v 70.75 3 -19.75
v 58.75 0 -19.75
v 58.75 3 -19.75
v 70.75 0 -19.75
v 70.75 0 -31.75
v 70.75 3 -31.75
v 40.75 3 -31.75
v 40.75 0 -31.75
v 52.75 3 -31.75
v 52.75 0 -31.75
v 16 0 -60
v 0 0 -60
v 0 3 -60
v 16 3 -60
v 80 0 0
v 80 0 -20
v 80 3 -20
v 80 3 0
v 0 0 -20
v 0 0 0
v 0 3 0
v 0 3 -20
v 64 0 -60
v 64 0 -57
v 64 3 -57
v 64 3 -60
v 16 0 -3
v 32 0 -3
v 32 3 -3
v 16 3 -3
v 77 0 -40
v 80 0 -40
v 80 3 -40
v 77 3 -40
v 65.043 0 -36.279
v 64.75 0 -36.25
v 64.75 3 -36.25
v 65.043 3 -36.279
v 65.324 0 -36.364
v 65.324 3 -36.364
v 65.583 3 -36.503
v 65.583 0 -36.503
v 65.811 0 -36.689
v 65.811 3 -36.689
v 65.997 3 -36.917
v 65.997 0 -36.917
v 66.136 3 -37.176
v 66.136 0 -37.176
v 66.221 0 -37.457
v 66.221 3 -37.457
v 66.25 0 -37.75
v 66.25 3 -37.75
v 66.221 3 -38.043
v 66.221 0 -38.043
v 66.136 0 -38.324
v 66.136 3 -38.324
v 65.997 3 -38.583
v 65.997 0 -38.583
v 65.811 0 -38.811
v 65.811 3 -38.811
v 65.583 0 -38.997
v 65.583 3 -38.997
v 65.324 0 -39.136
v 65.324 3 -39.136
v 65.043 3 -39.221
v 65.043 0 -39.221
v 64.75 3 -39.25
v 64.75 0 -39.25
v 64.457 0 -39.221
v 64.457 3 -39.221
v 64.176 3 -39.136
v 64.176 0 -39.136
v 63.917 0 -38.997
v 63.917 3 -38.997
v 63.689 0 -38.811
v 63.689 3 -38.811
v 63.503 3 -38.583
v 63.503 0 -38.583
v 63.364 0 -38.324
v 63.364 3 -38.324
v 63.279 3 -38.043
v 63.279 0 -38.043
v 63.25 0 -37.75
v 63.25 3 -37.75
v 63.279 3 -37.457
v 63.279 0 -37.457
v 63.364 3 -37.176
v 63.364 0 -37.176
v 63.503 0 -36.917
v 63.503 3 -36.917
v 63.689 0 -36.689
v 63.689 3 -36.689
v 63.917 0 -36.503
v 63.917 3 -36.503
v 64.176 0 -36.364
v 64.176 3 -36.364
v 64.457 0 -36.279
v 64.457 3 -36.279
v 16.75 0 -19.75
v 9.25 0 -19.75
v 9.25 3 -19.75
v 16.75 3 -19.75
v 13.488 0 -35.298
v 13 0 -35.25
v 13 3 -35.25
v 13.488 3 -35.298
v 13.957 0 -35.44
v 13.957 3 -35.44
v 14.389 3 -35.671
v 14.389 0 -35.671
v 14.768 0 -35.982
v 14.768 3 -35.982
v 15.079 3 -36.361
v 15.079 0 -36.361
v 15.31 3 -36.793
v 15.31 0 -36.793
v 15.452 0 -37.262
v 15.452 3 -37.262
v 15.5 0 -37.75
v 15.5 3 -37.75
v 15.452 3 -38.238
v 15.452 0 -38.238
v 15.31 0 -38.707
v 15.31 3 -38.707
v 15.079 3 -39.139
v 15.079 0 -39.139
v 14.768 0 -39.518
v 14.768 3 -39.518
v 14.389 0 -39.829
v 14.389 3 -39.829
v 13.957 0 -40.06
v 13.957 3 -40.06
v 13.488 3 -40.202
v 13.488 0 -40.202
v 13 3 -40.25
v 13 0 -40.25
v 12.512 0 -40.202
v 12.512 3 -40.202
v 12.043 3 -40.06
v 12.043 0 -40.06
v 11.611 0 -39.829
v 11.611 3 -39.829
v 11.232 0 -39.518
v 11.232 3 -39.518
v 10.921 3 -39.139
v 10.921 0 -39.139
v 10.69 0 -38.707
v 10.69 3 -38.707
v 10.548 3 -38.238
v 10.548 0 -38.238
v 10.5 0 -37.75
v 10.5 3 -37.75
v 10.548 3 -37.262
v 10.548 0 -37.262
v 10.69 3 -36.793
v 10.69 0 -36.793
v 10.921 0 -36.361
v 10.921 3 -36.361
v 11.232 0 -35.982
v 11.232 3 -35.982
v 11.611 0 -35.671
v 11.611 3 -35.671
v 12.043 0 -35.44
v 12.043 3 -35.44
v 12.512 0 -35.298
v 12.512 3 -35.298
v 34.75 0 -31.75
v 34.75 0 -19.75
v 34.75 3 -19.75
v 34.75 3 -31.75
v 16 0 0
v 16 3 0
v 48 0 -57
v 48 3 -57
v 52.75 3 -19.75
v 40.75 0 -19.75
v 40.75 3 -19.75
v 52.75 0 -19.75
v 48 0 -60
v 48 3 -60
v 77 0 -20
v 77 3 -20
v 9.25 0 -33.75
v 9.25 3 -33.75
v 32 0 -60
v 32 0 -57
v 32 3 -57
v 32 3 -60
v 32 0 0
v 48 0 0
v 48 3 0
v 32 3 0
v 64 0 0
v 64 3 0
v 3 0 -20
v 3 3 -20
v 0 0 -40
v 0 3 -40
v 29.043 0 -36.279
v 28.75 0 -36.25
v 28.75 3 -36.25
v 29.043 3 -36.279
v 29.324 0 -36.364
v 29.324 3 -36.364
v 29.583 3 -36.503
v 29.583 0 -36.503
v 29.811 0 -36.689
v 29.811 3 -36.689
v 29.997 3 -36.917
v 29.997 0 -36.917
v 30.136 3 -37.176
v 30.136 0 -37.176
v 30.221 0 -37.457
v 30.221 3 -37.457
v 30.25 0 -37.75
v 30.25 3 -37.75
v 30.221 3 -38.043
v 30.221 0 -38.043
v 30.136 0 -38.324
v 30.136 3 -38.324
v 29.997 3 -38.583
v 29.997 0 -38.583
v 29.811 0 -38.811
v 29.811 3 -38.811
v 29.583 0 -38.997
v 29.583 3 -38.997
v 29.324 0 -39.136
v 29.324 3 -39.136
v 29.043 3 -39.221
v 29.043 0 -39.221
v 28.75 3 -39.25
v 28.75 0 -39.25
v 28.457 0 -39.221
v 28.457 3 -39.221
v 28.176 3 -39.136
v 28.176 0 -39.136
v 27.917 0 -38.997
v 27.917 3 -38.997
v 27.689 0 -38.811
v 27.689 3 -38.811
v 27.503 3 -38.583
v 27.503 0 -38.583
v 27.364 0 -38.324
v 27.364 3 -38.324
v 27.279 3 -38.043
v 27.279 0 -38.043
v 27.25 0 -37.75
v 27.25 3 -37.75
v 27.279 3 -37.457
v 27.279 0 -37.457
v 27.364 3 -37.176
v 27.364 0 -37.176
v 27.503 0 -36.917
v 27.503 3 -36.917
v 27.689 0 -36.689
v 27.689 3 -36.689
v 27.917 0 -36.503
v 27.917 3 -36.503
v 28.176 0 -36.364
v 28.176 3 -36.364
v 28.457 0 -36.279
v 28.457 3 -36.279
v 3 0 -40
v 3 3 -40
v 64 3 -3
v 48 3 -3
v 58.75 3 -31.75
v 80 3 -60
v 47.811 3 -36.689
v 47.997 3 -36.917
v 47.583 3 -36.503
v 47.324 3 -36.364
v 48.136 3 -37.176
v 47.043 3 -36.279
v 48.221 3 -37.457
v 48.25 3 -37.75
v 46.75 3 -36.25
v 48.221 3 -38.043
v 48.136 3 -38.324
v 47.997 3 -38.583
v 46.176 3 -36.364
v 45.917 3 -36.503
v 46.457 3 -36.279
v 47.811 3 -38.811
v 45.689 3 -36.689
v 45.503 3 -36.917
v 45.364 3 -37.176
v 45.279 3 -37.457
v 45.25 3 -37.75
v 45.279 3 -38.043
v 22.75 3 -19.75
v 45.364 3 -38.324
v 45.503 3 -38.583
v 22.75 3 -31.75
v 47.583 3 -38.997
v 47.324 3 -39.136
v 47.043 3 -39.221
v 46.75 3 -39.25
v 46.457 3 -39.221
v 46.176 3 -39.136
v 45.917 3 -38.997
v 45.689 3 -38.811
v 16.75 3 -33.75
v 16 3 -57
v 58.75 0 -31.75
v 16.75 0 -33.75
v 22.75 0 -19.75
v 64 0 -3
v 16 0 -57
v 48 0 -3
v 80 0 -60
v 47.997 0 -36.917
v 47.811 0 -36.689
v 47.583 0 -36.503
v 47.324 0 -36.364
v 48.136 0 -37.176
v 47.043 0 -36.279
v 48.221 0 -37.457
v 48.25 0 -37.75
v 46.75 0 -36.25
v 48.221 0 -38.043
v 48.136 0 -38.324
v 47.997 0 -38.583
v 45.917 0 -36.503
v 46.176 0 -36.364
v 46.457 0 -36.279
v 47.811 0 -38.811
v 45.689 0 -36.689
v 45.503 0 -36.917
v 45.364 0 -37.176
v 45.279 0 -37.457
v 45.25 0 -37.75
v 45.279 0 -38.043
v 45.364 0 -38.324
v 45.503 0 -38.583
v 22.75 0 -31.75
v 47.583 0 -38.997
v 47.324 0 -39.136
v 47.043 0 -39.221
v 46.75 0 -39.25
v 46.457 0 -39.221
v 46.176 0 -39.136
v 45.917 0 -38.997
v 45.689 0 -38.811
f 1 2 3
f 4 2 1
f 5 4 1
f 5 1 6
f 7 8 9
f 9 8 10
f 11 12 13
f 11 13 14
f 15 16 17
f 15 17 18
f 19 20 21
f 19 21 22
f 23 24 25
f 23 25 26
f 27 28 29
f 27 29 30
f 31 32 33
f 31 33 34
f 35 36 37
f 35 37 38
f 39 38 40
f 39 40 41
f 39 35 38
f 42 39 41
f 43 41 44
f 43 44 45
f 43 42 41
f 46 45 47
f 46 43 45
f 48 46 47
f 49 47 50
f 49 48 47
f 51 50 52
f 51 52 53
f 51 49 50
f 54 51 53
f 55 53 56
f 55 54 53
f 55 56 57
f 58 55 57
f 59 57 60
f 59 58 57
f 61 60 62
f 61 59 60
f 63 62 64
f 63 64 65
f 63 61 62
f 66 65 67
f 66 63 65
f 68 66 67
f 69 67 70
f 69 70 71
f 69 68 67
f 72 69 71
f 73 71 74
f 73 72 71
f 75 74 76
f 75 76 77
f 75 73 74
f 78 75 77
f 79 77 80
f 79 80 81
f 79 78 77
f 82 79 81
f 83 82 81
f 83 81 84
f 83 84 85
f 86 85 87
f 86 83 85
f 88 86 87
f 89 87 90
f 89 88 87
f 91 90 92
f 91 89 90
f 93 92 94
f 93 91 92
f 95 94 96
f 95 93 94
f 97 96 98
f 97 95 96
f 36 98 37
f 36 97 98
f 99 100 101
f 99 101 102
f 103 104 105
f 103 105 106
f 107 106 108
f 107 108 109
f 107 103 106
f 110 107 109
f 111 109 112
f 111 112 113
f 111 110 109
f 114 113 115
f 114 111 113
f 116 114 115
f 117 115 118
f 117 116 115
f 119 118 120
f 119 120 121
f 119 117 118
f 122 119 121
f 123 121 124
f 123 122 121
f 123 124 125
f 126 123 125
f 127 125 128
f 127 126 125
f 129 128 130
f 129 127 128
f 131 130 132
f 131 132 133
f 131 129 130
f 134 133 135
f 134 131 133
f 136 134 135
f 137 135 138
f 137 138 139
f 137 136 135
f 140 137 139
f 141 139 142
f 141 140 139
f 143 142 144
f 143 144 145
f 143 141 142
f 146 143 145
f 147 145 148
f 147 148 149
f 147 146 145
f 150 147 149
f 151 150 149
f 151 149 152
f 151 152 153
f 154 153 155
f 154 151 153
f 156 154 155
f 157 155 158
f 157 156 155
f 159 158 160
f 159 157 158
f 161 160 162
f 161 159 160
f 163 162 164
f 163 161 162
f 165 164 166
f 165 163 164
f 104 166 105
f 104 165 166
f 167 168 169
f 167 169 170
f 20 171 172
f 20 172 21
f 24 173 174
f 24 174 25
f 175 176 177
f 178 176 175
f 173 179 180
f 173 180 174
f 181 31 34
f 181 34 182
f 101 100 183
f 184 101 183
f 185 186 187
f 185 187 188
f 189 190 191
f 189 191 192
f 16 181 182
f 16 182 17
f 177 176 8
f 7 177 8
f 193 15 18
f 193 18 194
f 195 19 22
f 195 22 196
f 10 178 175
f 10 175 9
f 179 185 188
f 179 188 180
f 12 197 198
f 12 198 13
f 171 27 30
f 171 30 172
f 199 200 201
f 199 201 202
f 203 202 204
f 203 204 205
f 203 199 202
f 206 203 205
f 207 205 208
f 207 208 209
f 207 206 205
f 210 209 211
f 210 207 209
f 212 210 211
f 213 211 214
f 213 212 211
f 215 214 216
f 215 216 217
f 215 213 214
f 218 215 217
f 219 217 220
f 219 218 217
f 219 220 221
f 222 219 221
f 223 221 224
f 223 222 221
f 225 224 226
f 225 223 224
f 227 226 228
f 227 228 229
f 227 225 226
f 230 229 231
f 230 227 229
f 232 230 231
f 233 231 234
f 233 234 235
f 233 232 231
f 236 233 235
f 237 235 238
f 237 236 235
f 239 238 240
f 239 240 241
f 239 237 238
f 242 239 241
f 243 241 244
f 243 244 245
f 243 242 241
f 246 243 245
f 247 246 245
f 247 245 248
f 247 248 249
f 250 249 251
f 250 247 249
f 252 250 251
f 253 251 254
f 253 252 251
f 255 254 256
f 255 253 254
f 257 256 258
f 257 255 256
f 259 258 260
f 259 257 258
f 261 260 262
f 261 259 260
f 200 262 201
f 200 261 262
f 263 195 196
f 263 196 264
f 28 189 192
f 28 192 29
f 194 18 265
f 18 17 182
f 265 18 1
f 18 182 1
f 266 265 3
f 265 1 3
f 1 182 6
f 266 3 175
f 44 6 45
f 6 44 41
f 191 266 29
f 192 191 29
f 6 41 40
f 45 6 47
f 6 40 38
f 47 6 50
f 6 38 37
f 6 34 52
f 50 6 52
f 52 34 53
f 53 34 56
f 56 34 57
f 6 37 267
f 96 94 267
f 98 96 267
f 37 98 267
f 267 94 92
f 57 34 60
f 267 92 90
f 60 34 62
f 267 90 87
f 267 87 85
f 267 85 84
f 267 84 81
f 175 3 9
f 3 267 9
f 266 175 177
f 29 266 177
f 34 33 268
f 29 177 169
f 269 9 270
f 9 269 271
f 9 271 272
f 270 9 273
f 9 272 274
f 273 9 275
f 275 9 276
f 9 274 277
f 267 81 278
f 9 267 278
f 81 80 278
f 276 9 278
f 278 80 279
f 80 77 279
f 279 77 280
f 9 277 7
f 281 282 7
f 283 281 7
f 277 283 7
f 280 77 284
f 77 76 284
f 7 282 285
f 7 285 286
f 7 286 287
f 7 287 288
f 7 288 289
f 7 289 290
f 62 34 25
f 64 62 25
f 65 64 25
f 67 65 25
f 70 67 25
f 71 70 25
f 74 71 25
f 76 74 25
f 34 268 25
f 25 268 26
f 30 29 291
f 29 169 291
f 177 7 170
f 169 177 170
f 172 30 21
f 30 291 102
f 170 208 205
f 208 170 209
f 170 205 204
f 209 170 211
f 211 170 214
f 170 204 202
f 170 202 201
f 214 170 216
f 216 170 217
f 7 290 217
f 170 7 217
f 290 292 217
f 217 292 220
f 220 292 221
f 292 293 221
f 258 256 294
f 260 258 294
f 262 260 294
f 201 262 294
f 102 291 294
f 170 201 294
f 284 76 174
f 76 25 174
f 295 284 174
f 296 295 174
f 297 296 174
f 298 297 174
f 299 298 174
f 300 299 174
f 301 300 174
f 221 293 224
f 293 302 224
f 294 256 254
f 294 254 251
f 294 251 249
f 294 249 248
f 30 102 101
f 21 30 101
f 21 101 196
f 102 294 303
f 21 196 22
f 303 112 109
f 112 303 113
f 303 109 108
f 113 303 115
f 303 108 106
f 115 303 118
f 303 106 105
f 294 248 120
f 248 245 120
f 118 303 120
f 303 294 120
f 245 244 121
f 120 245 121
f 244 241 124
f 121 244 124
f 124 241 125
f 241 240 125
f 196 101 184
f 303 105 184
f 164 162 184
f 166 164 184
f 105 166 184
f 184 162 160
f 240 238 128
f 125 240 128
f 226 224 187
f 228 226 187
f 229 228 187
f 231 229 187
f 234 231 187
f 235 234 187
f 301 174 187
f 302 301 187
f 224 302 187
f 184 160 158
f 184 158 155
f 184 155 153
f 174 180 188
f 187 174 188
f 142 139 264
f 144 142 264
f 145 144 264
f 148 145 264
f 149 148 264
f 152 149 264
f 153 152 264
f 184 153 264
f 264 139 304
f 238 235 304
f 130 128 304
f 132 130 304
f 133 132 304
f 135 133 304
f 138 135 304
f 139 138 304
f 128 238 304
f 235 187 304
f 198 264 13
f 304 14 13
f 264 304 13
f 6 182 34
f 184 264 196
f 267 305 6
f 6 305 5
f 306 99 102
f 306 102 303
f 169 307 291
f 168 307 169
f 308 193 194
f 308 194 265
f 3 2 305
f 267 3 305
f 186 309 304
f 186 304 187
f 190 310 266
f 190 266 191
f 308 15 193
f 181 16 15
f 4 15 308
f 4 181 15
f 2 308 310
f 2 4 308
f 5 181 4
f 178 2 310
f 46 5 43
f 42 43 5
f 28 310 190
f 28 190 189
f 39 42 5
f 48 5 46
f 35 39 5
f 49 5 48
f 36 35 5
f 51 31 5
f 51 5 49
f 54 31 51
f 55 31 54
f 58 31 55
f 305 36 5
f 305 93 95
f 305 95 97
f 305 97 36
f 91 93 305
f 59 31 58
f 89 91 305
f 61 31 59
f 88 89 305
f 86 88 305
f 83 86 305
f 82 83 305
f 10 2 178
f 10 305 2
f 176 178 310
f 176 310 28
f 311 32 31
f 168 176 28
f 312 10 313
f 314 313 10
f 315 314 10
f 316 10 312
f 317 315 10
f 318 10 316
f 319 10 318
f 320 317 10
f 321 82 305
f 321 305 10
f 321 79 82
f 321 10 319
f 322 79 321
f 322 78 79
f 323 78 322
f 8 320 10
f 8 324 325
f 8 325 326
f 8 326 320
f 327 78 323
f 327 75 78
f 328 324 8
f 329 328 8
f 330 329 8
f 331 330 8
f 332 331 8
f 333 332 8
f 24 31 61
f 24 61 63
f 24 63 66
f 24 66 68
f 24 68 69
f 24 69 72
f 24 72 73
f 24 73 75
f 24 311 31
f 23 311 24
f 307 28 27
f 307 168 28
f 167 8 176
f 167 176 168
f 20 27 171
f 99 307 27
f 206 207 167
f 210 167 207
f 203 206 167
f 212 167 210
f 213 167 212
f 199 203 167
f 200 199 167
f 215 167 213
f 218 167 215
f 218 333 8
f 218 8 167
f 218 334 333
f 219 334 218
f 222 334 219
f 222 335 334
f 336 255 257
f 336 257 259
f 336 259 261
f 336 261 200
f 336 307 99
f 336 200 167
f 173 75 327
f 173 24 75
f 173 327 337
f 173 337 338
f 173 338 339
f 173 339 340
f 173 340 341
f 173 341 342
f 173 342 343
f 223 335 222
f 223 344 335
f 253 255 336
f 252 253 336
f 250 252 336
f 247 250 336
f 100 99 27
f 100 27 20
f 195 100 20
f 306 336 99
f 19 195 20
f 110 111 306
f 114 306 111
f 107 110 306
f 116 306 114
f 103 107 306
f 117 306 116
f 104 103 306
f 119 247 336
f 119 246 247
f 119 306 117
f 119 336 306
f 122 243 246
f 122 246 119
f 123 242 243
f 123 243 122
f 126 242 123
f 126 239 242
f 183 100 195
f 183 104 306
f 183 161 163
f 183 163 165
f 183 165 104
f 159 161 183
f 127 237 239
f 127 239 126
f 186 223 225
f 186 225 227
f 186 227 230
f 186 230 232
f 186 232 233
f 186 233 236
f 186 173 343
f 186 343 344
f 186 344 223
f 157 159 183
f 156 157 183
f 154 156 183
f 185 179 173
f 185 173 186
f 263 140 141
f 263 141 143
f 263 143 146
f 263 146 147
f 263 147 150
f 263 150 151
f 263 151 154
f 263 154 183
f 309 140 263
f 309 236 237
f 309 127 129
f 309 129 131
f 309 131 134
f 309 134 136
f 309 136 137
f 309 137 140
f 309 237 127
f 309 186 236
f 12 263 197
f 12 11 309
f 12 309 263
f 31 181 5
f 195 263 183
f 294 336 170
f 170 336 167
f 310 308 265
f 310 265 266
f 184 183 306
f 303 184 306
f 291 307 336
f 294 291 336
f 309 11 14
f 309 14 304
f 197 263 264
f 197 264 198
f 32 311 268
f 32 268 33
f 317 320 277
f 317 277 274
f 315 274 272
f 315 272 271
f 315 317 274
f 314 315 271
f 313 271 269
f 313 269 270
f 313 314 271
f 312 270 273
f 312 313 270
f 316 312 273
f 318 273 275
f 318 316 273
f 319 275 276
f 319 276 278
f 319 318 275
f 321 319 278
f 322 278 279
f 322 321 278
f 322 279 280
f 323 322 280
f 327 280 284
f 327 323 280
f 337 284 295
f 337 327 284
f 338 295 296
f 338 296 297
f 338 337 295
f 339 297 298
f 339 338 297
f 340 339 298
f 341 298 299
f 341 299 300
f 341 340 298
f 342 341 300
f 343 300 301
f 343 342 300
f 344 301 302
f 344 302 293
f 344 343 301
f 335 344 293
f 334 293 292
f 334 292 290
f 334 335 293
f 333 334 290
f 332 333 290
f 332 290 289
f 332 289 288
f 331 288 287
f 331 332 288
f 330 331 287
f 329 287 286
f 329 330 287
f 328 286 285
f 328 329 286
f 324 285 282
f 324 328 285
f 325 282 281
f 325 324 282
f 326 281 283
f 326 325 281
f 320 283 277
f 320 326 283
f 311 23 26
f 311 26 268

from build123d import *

# Parameters (mm, degrees)
TOP_AND_BOTTOM_R              = 1.5
TOP_AND_BOTTOM_R_2            = 2.5
TOP_AND_BOTTOM_W              = 12
TOP_AND_BOTTOM_H              = 12
TOP_AND_BOTTOM_W_2            = 7.5
TOP_AND_BOTTOM_H_2            = 14
TOP_AND_BOTTOM_EXTRUDED_DEPTH = 3


with BuildPart() as part:
    # Top and Bottom → Top and Bottom Extruded (new body)
    with BuildSketch(Plane(origin=(0, 0, 0), x_dir=(1, 0, 0), z_dir=(0, 1, 0))):
        Polygon((32, 60), (48, 60), (48, 57), (64, 57), (64, 60), (80, 60), (80, 40), (77, 40), (77, 20), (80, 20), (80, 0), (64, 0), (64, 3), (48, 3), (48, 0), (32, 0), (32, 3), (16, 3), (16, 0), (0, 0), (0, 20), (3, 20), (3, 40), (0, 40), (0, 60), (16, 60), (16, 57), (32, 57), align=None)
        with Locations(Location((28.75, 37.75, 0), (0, 0, 270))):
            Circle(TOP_AND_BOTTOM_R, mode=Mode.SUBTRACT)
        with Locations(Location((46.75, 37.75, 0), (0, 0, 270))):
            Circle(TOP_AND_BOTTOM_R, mode=Mode.SUBTRACT)
        with Locations(Location((64.75, 37.75, 0), (0, 0, 270))):
            Circle(TOP_AND_BOTTOM_R, mode=Mode.SUBTRACT)
        with Locations(Location((13, 37.75, 0), (0, 0, 270))):
            Circle(TOP_AND_BOTTOM_R_2, mode=Mode.SUBTRACT)
        with Locations((46.75, 25.75)):
            Rectangle(TOP_AND_BOTTOM_W, TOP_AND_BOTTOM_H, mode=Mode.SUBTRACT)
        with Locations((28.75, 25.75)):
            Rectangle(TOP_AND_BOTTOM_W, TOP_AND_BOTTOM_H, mode=Mode.SUBTRACT)
        with Locations((64.75, 25.75)):
            Rectangle(TOP_AND_BOTTOM_W, TOP_AND_BOTTOM_H, mode=Mode.SUBTRACT)
        with Locations((13, 26.75)):
            Rectangle(TOP_AND_BOTTOM_W_2, TOP_AND_BOTTOM_H_2, mode=Mode.SUBTRACT)
    extrude(amount=TOP_AND_BOTTOM_EXTRUDED_DEPTH)


solid = part.part
